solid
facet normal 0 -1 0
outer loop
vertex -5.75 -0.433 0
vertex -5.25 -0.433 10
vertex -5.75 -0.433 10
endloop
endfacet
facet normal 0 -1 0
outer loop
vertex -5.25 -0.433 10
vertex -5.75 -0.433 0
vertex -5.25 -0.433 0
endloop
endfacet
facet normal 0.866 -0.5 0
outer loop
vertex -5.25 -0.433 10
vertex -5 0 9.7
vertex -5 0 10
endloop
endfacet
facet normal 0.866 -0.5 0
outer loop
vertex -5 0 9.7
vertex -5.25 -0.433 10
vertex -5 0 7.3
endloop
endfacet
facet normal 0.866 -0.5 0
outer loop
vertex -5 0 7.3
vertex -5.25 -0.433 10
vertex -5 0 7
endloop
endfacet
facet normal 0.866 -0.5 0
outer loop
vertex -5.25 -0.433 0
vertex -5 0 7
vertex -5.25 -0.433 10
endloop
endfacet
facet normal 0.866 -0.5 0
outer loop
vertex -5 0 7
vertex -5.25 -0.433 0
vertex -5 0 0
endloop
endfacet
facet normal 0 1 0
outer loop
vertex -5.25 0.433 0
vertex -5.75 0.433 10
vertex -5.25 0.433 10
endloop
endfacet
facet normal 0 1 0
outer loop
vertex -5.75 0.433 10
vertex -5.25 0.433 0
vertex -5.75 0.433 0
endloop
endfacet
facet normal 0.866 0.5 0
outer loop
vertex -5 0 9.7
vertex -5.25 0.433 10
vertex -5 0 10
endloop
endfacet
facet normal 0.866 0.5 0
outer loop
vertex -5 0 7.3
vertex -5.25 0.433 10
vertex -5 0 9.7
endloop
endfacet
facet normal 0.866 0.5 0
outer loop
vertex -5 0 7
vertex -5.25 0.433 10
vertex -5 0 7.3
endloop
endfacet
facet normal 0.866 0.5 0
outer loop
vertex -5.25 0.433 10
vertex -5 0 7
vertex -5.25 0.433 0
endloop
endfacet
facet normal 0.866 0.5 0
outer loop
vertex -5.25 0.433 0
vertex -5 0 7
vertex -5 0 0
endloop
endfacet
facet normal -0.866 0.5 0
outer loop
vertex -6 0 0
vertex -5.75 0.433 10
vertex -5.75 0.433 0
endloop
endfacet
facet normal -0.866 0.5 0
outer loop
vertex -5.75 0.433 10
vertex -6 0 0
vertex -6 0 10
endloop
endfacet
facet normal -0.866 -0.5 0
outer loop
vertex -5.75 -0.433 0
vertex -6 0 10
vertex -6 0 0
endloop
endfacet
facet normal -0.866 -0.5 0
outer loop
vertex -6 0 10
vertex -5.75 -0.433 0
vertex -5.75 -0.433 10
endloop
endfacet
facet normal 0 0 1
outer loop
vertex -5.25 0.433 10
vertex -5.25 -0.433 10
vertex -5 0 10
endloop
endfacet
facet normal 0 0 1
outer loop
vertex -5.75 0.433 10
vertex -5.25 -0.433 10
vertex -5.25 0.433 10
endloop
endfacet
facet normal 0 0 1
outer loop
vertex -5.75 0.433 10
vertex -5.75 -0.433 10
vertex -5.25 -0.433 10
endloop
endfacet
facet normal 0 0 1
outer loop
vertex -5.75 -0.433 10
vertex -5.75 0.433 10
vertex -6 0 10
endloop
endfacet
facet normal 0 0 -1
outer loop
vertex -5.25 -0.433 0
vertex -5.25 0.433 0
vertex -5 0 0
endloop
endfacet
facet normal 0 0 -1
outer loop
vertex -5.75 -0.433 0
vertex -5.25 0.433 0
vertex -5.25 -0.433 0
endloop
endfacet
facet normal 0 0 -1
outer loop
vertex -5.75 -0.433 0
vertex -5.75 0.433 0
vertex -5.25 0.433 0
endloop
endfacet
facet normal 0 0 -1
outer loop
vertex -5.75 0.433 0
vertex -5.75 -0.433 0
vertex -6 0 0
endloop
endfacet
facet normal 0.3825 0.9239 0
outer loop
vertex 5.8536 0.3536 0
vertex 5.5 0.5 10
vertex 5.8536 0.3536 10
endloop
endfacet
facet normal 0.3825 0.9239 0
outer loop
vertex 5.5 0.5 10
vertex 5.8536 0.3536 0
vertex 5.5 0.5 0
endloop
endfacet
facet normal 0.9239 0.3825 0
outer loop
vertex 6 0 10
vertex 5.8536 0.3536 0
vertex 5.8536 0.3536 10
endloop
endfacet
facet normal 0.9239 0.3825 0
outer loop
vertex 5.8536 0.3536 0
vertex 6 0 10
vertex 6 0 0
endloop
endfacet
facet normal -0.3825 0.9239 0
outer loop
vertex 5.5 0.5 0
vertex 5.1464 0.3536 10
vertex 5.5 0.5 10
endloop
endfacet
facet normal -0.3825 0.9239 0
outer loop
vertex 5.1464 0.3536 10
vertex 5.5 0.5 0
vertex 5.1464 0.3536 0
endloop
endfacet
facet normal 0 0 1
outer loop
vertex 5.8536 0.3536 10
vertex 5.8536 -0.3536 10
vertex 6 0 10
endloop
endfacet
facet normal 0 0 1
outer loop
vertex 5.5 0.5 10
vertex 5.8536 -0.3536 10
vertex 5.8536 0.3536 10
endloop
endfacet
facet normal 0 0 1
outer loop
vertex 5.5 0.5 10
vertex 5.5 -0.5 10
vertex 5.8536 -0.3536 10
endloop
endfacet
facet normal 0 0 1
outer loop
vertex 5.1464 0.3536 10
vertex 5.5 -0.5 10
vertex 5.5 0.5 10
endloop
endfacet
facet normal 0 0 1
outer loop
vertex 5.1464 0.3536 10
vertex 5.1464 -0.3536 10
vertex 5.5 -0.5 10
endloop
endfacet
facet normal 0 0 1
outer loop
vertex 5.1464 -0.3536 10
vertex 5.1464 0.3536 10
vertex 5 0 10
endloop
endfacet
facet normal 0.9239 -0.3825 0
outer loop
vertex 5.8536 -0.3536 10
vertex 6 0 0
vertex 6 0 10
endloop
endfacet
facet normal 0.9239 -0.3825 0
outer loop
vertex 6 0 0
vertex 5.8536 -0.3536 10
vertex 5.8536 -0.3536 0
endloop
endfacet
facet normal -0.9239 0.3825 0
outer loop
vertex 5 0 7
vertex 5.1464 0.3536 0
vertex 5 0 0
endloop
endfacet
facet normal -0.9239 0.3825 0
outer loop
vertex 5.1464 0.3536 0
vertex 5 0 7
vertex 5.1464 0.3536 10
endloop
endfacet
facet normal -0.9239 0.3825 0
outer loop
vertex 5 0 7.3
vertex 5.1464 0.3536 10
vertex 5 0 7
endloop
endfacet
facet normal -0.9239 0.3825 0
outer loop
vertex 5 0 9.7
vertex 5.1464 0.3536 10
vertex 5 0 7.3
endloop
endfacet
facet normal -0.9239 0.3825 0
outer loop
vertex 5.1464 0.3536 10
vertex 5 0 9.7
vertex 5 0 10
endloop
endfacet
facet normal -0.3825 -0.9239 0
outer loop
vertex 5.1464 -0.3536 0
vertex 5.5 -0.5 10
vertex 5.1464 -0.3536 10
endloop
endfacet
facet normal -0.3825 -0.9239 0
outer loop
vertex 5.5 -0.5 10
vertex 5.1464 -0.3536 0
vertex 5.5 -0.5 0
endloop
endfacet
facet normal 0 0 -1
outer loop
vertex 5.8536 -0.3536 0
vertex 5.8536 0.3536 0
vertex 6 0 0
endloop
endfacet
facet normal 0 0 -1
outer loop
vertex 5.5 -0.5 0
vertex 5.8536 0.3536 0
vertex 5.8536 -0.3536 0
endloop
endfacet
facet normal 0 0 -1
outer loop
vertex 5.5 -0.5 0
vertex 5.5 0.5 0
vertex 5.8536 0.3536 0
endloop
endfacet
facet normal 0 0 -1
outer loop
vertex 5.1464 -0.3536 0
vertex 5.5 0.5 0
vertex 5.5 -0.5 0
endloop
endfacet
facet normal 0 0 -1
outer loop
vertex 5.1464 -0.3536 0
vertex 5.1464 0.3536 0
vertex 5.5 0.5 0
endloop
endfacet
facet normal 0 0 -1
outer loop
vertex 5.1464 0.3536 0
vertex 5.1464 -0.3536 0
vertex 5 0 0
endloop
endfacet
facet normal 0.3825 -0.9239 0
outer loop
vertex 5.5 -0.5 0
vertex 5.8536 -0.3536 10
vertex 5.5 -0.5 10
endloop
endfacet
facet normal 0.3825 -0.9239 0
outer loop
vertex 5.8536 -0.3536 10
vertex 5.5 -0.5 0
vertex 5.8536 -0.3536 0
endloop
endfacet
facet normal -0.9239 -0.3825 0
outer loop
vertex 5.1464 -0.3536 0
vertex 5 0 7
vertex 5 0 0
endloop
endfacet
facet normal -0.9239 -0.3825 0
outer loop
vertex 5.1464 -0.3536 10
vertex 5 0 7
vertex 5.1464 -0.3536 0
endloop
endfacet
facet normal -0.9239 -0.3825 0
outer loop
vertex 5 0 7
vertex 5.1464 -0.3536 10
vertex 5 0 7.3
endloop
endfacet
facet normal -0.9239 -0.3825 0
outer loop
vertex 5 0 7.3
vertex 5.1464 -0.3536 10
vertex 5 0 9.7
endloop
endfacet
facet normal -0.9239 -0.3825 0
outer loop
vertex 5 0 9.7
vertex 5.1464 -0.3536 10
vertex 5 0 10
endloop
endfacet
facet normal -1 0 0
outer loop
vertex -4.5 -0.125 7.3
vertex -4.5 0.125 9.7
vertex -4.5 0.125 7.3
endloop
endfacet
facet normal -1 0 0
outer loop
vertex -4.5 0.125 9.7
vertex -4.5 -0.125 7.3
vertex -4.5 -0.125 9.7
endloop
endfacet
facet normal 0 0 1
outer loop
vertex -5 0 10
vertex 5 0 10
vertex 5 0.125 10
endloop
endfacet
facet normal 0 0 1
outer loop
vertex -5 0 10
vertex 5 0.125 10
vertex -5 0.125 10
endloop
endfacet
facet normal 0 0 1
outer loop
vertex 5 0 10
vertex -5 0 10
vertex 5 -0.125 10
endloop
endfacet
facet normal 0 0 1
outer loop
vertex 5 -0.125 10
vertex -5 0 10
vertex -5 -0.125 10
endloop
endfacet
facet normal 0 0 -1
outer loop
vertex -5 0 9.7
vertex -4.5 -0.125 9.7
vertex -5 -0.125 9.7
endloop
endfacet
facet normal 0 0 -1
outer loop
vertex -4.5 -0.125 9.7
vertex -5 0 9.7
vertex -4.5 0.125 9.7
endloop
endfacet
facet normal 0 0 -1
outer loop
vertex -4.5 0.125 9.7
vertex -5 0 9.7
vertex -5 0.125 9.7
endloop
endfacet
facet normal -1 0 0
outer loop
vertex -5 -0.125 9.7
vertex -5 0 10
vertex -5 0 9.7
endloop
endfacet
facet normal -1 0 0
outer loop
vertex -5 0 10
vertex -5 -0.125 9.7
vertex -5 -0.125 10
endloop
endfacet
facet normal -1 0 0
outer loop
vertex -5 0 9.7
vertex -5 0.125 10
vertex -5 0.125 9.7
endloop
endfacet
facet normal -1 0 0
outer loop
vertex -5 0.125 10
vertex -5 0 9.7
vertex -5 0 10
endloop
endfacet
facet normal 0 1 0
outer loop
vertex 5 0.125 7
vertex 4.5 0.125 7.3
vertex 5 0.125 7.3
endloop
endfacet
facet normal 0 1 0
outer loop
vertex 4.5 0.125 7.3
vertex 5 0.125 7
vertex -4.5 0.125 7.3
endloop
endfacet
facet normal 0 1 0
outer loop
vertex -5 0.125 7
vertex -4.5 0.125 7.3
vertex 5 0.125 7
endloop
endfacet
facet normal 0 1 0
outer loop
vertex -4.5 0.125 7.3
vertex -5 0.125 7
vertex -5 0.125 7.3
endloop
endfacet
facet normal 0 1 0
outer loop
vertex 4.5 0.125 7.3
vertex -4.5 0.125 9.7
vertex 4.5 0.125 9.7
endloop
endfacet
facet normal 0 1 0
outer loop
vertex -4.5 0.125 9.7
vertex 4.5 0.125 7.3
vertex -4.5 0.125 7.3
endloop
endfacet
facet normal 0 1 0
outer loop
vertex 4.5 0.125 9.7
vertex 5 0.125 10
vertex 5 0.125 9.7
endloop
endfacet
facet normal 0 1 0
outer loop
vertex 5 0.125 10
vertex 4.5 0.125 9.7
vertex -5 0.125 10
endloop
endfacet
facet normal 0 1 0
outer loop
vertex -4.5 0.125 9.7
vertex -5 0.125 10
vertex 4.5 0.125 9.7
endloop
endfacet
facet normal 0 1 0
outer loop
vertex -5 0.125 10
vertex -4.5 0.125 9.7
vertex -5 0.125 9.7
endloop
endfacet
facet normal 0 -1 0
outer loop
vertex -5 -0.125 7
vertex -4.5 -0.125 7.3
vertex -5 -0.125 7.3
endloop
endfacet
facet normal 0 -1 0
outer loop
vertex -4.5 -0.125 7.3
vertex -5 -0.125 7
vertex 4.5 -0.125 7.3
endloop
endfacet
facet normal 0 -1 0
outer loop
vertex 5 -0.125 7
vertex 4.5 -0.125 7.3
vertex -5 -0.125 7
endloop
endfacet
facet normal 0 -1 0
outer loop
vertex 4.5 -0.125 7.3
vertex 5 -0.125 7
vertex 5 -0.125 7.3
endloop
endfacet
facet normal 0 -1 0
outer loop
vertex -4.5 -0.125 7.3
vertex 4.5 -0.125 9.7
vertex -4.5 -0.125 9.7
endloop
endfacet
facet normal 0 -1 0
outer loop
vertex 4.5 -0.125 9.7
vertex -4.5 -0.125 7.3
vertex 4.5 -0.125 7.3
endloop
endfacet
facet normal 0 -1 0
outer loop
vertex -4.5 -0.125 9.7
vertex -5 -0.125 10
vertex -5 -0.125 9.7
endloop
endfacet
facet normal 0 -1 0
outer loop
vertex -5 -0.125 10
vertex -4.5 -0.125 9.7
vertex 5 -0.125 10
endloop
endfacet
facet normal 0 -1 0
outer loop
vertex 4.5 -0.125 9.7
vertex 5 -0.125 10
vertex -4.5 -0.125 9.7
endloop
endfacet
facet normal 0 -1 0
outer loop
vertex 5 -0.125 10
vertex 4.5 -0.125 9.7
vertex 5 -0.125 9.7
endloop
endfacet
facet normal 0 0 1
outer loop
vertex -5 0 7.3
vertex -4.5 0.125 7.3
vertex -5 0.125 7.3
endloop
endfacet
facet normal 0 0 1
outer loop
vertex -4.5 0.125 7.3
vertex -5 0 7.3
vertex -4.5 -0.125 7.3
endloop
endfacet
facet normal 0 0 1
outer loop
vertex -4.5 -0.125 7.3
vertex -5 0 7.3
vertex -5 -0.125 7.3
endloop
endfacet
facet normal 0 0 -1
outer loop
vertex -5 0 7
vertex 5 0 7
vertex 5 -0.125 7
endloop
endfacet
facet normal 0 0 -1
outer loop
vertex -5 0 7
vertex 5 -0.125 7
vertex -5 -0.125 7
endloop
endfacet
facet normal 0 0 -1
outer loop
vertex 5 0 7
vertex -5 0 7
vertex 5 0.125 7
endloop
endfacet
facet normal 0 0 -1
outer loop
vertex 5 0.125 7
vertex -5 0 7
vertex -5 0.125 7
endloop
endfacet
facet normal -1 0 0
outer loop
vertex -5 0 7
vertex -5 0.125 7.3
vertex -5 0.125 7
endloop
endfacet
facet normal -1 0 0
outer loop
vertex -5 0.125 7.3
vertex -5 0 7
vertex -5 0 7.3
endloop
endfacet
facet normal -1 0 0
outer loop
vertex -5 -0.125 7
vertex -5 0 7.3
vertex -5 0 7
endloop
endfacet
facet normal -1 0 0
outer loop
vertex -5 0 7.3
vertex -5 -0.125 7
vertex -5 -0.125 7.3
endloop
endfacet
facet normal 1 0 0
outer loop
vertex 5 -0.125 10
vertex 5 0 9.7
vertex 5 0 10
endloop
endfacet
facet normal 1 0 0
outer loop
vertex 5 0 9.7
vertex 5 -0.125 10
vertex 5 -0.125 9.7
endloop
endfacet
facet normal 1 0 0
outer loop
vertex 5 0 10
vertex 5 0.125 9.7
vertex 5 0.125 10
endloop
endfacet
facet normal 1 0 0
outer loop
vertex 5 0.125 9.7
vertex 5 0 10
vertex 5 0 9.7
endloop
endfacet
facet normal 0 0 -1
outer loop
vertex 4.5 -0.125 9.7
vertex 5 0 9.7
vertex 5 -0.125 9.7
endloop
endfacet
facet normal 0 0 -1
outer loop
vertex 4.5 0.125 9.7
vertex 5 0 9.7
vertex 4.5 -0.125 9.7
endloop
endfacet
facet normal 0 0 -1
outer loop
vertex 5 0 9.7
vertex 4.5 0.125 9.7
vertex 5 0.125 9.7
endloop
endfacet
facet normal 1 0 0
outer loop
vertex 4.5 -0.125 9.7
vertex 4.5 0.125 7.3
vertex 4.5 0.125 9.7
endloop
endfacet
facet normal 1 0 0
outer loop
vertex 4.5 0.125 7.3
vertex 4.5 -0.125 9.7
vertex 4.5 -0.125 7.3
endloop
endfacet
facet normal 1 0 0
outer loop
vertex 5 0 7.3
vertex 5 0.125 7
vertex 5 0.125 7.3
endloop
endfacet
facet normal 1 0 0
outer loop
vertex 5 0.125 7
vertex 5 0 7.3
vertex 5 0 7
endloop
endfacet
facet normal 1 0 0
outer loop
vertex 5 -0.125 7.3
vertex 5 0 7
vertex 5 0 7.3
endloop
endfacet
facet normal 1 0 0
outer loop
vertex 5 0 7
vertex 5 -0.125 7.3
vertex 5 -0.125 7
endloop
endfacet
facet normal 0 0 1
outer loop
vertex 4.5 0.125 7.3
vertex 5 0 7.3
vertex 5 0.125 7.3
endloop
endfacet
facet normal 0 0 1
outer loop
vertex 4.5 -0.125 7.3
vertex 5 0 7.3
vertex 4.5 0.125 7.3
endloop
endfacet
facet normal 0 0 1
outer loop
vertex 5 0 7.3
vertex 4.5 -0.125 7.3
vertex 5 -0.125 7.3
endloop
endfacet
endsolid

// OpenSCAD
module pillars() {
    color("#a0a0a0") {
        translate([-5.5, 0, 0]) {
            cylinder(d=1, h=10, $fn=6);
        }
        translate([5.5, 0, 0]) {
            cylinder(d=1, h=10, $fn=8);
        }
    }
}

module signbase() {
    color("#ffffff") {
        translate([-4.5, -0.125, 7]) {
            cube([9, 0.25,  3]);
        }
    }
}

module signholders() {
    color("#0c0cFF") {
        translate([-5, -0.125, 9.7]) {
            cube([0.5, 0.25, 0.3]);
        }
        translate([-5, -0.125, 7]) {
            cube([0.5, 0.25, 0.3]);
        }
        translate([4.5, -0.125, 9.7]) {
            cube([0.5, 0.25, 0.3]);
        }
        translate([4.5, -0.125, 7]) {
            cube([0.5, 0.25, 0.3]);
        } 
    }
}
 
pillars();
signbase();
signholders();
